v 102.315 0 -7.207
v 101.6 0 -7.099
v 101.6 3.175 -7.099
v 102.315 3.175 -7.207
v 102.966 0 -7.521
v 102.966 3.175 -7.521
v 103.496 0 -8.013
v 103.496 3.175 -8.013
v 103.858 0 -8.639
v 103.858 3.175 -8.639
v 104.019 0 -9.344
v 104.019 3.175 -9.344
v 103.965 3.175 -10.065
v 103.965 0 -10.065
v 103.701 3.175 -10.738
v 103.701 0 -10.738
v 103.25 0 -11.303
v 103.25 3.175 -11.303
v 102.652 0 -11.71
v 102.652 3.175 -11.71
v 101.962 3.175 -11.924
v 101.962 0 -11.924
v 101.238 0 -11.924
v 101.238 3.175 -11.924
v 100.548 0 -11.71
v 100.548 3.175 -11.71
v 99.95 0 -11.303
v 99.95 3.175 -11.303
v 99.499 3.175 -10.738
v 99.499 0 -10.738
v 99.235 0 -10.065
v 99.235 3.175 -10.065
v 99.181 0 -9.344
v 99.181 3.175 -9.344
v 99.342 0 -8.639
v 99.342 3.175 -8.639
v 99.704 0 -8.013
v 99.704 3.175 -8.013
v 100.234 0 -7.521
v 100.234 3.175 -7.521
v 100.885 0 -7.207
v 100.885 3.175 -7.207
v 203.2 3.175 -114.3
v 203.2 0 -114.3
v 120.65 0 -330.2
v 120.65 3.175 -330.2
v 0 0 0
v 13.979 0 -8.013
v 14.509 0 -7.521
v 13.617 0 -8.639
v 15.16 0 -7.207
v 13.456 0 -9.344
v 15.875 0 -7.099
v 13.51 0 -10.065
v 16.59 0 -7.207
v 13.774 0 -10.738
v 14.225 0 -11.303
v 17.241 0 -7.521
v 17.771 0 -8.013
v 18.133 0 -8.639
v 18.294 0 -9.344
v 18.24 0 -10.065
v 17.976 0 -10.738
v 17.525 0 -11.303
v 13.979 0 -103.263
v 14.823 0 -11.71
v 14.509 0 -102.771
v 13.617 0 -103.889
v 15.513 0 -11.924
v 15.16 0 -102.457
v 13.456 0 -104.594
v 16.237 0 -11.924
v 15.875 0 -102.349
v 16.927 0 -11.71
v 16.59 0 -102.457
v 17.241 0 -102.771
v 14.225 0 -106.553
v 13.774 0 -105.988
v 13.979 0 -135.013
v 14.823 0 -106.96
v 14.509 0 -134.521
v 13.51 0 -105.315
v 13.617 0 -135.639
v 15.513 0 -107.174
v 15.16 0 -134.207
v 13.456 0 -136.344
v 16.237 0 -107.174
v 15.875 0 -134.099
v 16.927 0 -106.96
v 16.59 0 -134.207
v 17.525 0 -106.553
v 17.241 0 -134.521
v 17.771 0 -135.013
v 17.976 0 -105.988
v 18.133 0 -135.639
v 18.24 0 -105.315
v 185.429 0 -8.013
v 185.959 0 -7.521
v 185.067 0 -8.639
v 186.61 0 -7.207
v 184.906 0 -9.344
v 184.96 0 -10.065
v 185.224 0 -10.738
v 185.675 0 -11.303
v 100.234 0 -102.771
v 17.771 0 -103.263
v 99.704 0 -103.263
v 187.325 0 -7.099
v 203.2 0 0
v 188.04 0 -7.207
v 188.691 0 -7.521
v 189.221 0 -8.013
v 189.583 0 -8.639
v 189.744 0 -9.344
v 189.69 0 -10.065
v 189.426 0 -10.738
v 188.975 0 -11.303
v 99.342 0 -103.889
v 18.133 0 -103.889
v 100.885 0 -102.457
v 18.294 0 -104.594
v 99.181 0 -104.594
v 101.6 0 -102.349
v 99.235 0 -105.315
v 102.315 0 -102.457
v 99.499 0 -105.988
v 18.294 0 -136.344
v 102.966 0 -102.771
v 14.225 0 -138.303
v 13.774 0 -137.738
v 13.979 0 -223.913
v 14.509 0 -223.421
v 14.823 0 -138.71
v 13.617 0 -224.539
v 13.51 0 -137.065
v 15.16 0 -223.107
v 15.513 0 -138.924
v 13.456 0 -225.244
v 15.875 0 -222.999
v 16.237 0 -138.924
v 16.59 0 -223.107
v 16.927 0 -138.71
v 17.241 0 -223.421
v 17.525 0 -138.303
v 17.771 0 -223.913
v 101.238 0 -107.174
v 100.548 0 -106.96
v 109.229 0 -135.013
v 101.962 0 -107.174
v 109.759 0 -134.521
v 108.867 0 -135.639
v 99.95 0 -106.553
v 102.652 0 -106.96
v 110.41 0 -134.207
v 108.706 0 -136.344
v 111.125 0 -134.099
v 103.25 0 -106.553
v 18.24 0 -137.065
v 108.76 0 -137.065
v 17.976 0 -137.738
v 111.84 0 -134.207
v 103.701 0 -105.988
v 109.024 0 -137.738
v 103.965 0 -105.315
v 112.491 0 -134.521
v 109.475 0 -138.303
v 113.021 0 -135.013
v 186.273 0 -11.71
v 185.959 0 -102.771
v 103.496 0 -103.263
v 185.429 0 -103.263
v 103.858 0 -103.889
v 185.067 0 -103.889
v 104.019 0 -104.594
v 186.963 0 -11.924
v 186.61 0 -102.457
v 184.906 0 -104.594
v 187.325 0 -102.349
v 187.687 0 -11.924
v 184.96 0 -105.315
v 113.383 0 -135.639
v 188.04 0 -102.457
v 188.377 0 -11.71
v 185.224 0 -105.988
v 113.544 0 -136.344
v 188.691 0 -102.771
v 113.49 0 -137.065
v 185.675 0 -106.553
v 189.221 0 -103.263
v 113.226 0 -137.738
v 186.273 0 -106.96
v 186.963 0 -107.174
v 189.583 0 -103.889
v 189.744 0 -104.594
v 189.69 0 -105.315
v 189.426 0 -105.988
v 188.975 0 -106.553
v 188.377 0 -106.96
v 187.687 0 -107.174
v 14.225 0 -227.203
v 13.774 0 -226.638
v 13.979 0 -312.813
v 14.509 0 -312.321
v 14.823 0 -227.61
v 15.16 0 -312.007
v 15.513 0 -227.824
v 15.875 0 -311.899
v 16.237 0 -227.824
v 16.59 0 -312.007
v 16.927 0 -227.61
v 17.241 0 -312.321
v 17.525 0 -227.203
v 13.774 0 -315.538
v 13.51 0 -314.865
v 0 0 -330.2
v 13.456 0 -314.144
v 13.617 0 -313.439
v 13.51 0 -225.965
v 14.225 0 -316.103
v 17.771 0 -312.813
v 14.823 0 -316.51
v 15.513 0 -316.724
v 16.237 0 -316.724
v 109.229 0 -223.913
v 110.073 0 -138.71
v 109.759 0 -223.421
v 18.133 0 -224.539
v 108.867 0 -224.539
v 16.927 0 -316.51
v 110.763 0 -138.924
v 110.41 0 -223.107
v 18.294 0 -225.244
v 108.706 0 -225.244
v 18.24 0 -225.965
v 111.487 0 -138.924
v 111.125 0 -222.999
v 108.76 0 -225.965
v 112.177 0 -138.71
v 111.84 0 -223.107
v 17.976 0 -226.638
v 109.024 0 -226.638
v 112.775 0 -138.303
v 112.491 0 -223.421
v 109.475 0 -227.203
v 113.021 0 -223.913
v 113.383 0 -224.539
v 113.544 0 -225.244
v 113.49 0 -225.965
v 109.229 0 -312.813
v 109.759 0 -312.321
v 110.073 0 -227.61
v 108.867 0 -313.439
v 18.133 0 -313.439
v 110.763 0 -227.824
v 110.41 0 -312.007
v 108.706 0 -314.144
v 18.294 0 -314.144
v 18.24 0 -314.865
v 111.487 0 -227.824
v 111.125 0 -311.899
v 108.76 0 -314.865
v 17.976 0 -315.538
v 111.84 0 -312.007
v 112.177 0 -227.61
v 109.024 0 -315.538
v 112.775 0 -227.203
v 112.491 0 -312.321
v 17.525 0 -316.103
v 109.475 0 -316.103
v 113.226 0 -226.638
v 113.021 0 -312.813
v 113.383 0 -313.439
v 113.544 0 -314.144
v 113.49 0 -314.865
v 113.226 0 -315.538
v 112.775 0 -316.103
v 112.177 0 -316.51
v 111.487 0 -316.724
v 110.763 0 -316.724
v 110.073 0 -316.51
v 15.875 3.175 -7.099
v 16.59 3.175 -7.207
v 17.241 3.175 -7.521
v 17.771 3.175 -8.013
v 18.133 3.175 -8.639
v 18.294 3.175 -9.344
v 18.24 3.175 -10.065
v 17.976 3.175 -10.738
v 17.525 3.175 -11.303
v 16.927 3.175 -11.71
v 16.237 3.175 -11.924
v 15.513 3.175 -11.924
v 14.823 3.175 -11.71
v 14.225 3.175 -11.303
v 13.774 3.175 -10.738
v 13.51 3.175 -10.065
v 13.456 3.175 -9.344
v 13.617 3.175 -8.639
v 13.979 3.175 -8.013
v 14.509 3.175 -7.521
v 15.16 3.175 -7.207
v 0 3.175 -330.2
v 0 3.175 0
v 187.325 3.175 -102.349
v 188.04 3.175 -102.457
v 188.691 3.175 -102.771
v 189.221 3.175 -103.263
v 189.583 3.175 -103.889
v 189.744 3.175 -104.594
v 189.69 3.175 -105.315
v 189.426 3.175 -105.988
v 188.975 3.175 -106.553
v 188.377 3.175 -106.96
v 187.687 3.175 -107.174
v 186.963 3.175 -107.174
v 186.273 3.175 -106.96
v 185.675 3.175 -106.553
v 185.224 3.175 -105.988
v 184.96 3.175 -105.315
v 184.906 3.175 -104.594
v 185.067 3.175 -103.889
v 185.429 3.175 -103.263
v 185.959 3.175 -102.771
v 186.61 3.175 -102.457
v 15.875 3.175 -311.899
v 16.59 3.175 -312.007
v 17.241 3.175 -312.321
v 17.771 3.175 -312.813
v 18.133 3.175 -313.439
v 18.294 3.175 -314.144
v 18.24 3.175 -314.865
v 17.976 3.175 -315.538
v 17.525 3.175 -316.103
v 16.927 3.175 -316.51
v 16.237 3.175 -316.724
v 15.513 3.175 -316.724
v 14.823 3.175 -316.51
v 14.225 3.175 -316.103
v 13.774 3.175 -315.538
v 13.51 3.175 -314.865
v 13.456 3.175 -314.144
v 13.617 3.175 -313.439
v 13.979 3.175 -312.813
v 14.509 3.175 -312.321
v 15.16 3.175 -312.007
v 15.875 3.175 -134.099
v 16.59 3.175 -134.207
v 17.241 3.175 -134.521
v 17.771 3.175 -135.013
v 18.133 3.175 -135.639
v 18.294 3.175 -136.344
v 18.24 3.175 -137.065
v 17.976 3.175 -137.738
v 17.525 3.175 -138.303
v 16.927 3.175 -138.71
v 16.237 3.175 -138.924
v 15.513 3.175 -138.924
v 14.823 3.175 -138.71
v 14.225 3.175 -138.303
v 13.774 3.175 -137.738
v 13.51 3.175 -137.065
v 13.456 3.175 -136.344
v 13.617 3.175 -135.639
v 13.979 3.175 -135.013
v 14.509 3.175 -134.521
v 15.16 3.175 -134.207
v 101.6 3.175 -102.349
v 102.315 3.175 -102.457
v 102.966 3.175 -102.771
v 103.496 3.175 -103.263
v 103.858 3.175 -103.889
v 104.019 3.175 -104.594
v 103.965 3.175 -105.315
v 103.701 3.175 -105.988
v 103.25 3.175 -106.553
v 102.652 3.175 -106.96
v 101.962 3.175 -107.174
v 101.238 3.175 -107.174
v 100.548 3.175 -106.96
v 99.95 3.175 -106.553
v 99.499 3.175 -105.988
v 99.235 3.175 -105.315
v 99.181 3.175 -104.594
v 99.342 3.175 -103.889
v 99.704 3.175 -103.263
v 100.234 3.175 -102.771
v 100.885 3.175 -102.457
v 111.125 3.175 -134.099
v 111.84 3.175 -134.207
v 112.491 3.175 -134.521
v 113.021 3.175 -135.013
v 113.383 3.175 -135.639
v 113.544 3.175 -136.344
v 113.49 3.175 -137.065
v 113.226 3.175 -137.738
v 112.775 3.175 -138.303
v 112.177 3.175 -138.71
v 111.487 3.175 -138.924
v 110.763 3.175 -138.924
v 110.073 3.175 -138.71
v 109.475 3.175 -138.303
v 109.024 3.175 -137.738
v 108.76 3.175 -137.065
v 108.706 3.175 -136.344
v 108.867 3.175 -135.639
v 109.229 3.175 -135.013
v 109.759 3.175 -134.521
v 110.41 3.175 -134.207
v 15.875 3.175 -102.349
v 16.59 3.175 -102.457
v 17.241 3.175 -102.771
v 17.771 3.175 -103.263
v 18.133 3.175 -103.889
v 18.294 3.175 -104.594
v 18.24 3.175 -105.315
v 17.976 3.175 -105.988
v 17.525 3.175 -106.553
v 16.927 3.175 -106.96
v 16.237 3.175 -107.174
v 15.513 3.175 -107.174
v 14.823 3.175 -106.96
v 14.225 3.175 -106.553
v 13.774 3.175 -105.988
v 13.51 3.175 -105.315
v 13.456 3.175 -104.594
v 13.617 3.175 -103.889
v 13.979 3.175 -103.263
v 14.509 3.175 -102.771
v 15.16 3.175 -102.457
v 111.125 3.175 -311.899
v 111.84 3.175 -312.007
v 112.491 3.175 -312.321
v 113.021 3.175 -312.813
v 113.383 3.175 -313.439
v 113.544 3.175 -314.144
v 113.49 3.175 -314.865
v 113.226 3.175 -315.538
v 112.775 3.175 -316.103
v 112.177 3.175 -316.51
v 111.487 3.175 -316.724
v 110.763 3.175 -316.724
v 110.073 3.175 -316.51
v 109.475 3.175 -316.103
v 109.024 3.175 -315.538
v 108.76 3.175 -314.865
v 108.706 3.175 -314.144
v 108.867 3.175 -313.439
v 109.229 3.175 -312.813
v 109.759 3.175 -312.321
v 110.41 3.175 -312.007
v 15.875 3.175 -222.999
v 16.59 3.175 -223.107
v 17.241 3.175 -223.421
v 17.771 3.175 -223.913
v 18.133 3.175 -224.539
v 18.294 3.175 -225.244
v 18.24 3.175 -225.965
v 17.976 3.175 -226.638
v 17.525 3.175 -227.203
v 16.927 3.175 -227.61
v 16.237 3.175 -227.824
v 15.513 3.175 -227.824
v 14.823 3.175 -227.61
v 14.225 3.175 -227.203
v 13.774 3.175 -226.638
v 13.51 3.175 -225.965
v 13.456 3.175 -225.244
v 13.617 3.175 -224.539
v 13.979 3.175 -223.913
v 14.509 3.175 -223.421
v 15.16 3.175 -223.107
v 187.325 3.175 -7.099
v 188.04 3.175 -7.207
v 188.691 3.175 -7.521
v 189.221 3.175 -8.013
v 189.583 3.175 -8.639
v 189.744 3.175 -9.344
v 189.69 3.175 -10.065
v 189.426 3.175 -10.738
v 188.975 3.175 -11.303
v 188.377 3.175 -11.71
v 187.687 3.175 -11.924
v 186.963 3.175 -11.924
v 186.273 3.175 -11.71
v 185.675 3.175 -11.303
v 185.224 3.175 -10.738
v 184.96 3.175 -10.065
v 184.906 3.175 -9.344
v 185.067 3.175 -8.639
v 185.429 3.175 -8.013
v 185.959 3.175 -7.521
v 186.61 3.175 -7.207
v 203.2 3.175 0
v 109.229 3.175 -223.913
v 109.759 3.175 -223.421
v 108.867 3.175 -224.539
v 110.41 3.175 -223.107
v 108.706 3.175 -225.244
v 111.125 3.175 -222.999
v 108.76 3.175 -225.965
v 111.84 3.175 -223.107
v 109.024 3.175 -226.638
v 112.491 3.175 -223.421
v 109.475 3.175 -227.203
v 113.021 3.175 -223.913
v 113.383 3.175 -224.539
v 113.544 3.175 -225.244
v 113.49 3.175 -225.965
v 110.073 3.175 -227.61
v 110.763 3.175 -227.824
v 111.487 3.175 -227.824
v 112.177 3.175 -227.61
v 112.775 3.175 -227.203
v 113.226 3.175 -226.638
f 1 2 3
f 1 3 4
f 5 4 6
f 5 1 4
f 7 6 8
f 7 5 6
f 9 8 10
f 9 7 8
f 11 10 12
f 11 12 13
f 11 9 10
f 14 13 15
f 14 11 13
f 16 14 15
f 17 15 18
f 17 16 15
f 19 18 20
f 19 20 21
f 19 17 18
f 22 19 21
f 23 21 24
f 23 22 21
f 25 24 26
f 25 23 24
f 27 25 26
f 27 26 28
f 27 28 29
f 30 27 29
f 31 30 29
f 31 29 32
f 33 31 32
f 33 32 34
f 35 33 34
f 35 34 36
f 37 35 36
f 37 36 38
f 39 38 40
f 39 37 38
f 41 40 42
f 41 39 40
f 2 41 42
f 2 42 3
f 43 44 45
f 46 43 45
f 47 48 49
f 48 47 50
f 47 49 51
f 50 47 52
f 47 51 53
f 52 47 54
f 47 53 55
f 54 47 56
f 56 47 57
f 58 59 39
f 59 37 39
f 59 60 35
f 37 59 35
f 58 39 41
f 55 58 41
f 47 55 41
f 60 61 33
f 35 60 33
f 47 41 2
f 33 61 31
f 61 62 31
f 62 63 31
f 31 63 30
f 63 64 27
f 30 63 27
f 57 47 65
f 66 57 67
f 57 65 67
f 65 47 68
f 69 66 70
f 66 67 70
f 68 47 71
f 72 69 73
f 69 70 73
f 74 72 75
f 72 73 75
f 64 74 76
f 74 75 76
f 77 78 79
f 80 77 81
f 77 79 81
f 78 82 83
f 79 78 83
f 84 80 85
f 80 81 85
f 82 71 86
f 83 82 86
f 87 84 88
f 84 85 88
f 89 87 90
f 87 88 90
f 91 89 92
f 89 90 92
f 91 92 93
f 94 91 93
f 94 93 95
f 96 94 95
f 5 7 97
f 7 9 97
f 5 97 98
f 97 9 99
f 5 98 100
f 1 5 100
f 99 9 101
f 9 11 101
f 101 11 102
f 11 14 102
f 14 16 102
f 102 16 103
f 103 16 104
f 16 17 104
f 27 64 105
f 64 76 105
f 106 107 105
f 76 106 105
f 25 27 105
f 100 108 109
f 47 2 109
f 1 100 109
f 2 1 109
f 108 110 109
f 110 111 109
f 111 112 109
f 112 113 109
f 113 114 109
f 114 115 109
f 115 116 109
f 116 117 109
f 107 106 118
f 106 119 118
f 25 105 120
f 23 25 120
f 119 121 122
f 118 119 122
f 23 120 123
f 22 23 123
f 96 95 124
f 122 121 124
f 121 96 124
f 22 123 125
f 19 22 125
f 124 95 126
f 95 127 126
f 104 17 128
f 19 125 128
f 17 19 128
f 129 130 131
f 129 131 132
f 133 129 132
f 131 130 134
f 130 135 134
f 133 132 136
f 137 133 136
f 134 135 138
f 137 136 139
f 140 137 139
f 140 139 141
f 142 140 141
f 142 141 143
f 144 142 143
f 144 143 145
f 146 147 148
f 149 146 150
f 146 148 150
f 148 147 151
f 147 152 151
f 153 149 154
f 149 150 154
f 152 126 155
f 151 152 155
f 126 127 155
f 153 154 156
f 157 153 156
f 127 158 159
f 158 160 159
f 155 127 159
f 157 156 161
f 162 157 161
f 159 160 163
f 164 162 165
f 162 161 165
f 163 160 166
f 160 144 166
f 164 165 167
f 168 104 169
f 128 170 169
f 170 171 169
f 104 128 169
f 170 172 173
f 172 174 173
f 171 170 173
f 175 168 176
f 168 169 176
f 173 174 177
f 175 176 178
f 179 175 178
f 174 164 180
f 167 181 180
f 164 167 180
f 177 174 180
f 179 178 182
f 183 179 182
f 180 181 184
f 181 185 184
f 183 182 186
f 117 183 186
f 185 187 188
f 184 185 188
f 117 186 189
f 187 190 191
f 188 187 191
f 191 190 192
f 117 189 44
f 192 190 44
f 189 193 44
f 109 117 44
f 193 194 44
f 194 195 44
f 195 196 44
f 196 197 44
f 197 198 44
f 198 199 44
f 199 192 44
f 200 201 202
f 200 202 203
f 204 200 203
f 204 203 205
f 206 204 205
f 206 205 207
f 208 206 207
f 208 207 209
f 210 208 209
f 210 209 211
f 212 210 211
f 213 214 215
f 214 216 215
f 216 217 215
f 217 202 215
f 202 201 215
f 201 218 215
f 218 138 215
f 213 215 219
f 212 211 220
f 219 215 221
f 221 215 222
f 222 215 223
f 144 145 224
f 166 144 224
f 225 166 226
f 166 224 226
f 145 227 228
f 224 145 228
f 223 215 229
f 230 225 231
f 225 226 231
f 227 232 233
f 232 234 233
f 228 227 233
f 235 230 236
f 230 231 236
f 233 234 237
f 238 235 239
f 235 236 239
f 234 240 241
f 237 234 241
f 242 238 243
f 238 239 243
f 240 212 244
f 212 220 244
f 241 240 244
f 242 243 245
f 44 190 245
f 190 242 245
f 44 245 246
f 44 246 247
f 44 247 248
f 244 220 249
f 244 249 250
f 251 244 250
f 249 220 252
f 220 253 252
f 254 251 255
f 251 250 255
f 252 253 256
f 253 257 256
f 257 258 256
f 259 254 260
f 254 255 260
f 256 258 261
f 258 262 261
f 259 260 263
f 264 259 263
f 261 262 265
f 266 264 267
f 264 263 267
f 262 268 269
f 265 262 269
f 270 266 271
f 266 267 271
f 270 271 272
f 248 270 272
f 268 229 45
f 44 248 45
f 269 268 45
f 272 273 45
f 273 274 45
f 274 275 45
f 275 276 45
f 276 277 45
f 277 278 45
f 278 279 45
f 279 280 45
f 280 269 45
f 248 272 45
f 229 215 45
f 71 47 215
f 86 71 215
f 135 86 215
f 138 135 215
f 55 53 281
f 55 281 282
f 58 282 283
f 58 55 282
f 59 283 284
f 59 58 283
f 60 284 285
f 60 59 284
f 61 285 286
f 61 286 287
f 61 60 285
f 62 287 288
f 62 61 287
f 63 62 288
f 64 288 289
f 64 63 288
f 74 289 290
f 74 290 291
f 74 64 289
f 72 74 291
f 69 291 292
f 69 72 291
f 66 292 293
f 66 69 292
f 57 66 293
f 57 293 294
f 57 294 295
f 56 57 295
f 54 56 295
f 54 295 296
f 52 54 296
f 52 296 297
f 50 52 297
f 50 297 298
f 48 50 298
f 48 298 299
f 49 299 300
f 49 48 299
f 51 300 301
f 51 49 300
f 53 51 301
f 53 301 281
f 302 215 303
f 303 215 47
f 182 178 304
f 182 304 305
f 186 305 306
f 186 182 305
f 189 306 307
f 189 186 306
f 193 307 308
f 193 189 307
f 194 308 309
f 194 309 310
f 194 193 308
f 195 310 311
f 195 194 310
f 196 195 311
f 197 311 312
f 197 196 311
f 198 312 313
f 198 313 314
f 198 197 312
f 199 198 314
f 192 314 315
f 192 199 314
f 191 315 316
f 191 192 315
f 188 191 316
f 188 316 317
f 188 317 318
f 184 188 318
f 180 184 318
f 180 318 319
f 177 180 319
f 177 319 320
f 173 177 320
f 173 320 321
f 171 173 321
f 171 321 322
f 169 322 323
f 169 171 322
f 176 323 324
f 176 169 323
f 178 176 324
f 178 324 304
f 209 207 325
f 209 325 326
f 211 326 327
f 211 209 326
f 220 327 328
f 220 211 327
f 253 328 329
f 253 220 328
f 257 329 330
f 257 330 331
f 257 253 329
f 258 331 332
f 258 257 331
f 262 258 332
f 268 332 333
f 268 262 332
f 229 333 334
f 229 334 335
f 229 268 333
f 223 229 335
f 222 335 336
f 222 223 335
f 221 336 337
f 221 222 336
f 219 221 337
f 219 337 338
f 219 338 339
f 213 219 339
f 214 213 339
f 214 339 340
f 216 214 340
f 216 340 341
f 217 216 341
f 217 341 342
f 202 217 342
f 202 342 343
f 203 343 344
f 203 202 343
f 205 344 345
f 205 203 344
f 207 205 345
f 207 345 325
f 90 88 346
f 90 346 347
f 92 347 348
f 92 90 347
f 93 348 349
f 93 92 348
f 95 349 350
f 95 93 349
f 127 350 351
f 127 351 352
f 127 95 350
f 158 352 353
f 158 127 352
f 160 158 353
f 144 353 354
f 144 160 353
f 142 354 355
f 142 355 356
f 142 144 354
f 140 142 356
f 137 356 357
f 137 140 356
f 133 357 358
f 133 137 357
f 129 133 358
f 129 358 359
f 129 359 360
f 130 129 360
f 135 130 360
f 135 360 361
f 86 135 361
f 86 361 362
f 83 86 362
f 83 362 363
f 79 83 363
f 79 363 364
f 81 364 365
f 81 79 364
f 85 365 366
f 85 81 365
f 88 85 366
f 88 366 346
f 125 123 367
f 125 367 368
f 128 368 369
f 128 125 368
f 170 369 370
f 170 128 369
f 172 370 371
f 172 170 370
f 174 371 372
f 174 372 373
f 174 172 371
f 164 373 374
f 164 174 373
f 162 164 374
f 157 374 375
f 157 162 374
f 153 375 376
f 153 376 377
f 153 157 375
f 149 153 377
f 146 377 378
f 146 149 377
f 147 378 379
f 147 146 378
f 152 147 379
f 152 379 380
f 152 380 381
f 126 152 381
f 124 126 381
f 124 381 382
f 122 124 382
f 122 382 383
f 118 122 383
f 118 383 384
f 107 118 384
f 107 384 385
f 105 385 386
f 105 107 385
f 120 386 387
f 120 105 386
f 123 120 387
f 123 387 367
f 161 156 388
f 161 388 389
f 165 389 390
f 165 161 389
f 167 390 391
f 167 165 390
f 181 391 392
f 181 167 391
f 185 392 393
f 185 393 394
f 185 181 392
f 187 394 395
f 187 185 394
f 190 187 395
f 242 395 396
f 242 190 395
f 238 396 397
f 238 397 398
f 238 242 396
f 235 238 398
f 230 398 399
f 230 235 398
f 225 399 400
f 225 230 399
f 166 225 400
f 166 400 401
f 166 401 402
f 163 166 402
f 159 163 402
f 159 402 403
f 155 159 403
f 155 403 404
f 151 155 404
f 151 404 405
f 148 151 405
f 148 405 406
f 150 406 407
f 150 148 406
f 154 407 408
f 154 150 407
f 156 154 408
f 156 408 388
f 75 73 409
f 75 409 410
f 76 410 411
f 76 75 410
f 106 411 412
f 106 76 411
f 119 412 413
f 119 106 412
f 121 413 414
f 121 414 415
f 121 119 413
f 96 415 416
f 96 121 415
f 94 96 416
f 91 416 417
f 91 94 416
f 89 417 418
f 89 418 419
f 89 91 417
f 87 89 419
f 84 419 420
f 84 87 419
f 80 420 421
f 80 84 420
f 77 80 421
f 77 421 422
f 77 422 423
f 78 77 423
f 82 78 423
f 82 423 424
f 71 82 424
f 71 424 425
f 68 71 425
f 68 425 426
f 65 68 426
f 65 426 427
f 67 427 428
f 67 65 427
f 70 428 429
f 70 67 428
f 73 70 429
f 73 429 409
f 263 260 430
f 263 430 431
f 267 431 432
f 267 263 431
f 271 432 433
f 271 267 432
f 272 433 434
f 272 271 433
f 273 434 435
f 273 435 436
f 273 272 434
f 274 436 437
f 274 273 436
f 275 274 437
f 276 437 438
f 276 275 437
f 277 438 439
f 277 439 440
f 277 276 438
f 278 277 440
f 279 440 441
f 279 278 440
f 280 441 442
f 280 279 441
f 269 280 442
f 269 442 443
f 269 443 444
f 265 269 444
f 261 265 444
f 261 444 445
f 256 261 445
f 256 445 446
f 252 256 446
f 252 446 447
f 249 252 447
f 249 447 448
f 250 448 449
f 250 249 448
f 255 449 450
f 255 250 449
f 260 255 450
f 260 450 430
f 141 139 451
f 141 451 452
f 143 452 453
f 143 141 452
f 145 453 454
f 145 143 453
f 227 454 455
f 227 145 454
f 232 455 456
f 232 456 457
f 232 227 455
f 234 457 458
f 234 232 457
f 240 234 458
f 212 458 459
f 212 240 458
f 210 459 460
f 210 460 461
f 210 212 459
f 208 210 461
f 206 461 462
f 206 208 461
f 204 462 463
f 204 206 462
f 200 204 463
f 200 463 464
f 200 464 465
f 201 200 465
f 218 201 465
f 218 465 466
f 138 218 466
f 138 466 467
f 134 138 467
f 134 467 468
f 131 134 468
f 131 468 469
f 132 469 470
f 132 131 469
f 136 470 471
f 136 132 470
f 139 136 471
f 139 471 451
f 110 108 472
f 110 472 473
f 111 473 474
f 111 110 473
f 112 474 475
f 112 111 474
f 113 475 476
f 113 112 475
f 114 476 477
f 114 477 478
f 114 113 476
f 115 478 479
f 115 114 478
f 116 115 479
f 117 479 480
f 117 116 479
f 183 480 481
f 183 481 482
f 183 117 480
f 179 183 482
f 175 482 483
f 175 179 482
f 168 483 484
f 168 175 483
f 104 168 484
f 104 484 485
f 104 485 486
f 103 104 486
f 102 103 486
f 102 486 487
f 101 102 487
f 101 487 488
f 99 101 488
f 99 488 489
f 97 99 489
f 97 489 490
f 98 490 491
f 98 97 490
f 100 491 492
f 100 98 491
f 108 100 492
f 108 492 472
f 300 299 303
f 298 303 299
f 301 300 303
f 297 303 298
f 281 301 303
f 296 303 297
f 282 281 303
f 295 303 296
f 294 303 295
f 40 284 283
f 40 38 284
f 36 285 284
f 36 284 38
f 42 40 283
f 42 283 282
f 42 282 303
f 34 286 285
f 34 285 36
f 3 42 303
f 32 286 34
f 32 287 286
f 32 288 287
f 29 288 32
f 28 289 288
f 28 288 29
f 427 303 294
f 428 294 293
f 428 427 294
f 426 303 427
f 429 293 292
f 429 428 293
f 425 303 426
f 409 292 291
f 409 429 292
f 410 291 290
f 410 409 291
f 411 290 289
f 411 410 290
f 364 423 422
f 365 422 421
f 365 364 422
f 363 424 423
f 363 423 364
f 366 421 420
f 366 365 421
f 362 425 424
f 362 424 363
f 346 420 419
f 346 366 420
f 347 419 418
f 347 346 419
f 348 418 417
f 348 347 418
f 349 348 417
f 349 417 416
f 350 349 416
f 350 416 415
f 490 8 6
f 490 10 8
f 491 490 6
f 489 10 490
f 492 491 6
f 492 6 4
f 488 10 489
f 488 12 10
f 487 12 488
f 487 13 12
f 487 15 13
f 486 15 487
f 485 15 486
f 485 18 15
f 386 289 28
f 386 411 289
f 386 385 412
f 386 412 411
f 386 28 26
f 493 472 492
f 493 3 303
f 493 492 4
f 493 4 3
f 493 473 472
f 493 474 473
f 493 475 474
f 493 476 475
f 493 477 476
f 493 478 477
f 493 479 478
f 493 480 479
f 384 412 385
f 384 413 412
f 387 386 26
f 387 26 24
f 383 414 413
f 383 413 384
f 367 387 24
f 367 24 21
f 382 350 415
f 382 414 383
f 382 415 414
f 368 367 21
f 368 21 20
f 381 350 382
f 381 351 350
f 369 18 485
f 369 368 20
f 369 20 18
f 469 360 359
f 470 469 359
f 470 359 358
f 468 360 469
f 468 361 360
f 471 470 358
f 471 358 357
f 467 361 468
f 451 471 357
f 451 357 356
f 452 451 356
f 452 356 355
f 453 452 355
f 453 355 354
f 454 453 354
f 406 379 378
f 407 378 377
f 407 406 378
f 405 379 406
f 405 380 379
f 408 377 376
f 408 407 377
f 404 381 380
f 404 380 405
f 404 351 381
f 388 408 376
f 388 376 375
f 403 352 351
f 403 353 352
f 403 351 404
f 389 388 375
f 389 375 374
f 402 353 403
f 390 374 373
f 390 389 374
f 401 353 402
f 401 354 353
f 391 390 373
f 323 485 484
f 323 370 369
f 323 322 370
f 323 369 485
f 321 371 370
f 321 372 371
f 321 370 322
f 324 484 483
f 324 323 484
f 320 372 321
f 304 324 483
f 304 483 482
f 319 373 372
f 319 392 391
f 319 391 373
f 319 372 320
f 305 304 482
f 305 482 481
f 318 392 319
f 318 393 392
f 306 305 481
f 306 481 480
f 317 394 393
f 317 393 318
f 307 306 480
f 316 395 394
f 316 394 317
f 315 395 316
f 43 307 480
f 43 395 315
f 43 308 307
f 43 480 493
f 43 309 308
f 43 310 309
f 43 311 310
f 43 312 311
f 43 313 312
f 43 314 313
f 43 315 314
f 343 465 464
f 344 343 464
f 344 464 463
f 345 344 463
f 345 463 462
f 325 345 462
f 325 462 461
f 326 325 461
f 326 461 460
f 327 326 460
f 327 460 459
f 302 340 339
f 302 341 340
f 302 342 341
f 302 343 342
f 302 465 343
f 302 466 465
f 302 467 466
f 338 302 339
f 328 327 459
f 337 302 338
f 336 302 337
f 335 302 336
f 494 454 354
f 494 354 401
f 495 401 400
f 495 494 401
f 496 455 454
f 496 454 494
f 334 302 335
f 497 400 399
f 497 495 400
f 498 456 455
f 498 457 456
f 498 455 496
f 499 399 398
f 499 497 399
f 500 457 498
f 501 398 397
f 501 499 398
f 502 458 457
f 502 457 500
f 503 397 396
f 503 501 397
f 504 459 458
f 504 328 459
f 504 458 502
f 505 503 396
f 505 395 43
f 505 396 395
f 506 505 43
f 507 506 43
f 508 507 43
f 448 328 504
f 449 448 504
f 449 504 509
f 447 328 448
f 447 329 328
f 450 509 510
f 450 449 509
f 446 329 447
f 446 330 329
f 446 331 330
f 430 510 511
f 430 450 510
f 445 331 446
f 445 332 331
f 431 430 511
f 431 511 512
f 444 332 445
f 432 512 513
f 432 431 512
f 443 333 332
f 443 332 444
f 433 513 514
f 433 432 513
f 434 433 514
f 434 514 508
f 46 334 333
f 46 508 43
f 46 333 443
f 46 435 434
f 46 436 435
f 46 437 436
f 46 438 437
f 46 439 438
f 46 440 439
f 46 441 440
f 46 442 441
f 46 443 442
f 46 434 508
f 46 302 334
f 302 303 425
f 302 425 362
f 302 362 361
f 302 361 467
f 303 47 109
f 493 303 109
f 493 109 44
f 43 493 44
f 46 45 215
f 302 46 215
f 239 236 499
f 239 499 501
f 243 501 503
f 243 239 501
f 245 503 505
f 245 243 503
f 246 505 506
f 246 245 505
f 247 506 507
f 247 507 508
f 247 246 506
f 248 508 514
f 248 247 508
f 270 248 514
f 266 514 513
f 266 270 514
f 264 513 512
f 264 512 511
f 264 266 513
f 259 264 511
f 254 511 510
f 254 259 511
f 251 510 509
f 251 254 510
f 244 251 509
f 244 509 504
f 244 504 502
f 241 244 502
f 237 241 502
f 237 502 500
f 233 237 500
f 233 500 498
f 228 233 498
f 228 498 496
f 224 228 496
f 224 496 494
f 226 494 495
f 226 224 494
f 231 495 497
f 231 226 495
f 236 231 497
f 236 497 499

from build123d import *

# Parameters (mm, degrees)
SKETCH1_R           = 2.4257
BOSS_EXTRUDE1_DEPTH = 3.175


with BuildPart() as part:
    # Sketch1 → Boss-Extrude1 (new body)
    with BuildSketch(Plane(origin=(0, 0, 0), x_dir=(1, 0, 0), z_dir=(0, 1, 0))):
        Polygon((0, 0), (203.2, 0), (203.2, 114.3), (120.65, 330.2), (0, 330.2), align=None)
        with Locations(Location((15.875, 9.525, 0), (0, 0, 270))):
            Circle(SKETCH1_R, mode=Mode.SUBTRACT)
        with Locations(Location((101.6, 9.525, 0), (0, 0, 270))):
            Circle(SKETCH1_R, mode=Mode.SUBTRACT)
        with Locations(Location((187.325, 9.525, 0), (0, 0, 270))):
            Circle(SKETCH1_R, mode=Mode.SUBTRACT)
        with Locations(Location((15.875, 104.775, 0), (0, 0, 270))):
            Circle(SKETCH1_R, mode=Mode.SUBTRACT)
        with Locations(Location((187.325, 104.775, 0), (0, 0, 270))):
            Circle(SKETCH1_R, mode=Mode.SUBTRACT)
        with Locations(Location((101.6, 104.775, 0), (0, 0, 270))):
            Circle(SKETCH1_R, mode=Mode.SUBTRACT)
        with Locations(Location((15.875, 136.525, 0), (0, 0, 270))):
            Circle(SKETCH1_R, mode=Mode.SUBTRACT)
        with Locations(Location((111.125, 136.525, 0), (0, 0, 270))):
            Circle(SKETCH1_R, mode=Mode.SUBTRACT)
        with Locations(Location((15.875, 225.425, 0), (0, 0, 270))):
            Circle(SKETCH1_R, mode=Mode.SUBTRACT)
        with Locations(Location((15.875, 314.325, 0), (0, 0, 270))):
            Circle(SKETCH1_R, mode=Mode.SUBTRACT)
        with Locations(Location((111.125, 225.425, 0), (0, 0, 270))):
            Circle(SKETCH1_R, mode=Mode.SUBTRACT)
        with Locations(Location((111.125, 314.325, 0), (0, 0, 270))):
            Circle(SKETCH1_R, mode=Mode.SUBTRACT)
    extrude(amount=BOSS_EXTRUDE1_DEPTH)


solid = part.part
